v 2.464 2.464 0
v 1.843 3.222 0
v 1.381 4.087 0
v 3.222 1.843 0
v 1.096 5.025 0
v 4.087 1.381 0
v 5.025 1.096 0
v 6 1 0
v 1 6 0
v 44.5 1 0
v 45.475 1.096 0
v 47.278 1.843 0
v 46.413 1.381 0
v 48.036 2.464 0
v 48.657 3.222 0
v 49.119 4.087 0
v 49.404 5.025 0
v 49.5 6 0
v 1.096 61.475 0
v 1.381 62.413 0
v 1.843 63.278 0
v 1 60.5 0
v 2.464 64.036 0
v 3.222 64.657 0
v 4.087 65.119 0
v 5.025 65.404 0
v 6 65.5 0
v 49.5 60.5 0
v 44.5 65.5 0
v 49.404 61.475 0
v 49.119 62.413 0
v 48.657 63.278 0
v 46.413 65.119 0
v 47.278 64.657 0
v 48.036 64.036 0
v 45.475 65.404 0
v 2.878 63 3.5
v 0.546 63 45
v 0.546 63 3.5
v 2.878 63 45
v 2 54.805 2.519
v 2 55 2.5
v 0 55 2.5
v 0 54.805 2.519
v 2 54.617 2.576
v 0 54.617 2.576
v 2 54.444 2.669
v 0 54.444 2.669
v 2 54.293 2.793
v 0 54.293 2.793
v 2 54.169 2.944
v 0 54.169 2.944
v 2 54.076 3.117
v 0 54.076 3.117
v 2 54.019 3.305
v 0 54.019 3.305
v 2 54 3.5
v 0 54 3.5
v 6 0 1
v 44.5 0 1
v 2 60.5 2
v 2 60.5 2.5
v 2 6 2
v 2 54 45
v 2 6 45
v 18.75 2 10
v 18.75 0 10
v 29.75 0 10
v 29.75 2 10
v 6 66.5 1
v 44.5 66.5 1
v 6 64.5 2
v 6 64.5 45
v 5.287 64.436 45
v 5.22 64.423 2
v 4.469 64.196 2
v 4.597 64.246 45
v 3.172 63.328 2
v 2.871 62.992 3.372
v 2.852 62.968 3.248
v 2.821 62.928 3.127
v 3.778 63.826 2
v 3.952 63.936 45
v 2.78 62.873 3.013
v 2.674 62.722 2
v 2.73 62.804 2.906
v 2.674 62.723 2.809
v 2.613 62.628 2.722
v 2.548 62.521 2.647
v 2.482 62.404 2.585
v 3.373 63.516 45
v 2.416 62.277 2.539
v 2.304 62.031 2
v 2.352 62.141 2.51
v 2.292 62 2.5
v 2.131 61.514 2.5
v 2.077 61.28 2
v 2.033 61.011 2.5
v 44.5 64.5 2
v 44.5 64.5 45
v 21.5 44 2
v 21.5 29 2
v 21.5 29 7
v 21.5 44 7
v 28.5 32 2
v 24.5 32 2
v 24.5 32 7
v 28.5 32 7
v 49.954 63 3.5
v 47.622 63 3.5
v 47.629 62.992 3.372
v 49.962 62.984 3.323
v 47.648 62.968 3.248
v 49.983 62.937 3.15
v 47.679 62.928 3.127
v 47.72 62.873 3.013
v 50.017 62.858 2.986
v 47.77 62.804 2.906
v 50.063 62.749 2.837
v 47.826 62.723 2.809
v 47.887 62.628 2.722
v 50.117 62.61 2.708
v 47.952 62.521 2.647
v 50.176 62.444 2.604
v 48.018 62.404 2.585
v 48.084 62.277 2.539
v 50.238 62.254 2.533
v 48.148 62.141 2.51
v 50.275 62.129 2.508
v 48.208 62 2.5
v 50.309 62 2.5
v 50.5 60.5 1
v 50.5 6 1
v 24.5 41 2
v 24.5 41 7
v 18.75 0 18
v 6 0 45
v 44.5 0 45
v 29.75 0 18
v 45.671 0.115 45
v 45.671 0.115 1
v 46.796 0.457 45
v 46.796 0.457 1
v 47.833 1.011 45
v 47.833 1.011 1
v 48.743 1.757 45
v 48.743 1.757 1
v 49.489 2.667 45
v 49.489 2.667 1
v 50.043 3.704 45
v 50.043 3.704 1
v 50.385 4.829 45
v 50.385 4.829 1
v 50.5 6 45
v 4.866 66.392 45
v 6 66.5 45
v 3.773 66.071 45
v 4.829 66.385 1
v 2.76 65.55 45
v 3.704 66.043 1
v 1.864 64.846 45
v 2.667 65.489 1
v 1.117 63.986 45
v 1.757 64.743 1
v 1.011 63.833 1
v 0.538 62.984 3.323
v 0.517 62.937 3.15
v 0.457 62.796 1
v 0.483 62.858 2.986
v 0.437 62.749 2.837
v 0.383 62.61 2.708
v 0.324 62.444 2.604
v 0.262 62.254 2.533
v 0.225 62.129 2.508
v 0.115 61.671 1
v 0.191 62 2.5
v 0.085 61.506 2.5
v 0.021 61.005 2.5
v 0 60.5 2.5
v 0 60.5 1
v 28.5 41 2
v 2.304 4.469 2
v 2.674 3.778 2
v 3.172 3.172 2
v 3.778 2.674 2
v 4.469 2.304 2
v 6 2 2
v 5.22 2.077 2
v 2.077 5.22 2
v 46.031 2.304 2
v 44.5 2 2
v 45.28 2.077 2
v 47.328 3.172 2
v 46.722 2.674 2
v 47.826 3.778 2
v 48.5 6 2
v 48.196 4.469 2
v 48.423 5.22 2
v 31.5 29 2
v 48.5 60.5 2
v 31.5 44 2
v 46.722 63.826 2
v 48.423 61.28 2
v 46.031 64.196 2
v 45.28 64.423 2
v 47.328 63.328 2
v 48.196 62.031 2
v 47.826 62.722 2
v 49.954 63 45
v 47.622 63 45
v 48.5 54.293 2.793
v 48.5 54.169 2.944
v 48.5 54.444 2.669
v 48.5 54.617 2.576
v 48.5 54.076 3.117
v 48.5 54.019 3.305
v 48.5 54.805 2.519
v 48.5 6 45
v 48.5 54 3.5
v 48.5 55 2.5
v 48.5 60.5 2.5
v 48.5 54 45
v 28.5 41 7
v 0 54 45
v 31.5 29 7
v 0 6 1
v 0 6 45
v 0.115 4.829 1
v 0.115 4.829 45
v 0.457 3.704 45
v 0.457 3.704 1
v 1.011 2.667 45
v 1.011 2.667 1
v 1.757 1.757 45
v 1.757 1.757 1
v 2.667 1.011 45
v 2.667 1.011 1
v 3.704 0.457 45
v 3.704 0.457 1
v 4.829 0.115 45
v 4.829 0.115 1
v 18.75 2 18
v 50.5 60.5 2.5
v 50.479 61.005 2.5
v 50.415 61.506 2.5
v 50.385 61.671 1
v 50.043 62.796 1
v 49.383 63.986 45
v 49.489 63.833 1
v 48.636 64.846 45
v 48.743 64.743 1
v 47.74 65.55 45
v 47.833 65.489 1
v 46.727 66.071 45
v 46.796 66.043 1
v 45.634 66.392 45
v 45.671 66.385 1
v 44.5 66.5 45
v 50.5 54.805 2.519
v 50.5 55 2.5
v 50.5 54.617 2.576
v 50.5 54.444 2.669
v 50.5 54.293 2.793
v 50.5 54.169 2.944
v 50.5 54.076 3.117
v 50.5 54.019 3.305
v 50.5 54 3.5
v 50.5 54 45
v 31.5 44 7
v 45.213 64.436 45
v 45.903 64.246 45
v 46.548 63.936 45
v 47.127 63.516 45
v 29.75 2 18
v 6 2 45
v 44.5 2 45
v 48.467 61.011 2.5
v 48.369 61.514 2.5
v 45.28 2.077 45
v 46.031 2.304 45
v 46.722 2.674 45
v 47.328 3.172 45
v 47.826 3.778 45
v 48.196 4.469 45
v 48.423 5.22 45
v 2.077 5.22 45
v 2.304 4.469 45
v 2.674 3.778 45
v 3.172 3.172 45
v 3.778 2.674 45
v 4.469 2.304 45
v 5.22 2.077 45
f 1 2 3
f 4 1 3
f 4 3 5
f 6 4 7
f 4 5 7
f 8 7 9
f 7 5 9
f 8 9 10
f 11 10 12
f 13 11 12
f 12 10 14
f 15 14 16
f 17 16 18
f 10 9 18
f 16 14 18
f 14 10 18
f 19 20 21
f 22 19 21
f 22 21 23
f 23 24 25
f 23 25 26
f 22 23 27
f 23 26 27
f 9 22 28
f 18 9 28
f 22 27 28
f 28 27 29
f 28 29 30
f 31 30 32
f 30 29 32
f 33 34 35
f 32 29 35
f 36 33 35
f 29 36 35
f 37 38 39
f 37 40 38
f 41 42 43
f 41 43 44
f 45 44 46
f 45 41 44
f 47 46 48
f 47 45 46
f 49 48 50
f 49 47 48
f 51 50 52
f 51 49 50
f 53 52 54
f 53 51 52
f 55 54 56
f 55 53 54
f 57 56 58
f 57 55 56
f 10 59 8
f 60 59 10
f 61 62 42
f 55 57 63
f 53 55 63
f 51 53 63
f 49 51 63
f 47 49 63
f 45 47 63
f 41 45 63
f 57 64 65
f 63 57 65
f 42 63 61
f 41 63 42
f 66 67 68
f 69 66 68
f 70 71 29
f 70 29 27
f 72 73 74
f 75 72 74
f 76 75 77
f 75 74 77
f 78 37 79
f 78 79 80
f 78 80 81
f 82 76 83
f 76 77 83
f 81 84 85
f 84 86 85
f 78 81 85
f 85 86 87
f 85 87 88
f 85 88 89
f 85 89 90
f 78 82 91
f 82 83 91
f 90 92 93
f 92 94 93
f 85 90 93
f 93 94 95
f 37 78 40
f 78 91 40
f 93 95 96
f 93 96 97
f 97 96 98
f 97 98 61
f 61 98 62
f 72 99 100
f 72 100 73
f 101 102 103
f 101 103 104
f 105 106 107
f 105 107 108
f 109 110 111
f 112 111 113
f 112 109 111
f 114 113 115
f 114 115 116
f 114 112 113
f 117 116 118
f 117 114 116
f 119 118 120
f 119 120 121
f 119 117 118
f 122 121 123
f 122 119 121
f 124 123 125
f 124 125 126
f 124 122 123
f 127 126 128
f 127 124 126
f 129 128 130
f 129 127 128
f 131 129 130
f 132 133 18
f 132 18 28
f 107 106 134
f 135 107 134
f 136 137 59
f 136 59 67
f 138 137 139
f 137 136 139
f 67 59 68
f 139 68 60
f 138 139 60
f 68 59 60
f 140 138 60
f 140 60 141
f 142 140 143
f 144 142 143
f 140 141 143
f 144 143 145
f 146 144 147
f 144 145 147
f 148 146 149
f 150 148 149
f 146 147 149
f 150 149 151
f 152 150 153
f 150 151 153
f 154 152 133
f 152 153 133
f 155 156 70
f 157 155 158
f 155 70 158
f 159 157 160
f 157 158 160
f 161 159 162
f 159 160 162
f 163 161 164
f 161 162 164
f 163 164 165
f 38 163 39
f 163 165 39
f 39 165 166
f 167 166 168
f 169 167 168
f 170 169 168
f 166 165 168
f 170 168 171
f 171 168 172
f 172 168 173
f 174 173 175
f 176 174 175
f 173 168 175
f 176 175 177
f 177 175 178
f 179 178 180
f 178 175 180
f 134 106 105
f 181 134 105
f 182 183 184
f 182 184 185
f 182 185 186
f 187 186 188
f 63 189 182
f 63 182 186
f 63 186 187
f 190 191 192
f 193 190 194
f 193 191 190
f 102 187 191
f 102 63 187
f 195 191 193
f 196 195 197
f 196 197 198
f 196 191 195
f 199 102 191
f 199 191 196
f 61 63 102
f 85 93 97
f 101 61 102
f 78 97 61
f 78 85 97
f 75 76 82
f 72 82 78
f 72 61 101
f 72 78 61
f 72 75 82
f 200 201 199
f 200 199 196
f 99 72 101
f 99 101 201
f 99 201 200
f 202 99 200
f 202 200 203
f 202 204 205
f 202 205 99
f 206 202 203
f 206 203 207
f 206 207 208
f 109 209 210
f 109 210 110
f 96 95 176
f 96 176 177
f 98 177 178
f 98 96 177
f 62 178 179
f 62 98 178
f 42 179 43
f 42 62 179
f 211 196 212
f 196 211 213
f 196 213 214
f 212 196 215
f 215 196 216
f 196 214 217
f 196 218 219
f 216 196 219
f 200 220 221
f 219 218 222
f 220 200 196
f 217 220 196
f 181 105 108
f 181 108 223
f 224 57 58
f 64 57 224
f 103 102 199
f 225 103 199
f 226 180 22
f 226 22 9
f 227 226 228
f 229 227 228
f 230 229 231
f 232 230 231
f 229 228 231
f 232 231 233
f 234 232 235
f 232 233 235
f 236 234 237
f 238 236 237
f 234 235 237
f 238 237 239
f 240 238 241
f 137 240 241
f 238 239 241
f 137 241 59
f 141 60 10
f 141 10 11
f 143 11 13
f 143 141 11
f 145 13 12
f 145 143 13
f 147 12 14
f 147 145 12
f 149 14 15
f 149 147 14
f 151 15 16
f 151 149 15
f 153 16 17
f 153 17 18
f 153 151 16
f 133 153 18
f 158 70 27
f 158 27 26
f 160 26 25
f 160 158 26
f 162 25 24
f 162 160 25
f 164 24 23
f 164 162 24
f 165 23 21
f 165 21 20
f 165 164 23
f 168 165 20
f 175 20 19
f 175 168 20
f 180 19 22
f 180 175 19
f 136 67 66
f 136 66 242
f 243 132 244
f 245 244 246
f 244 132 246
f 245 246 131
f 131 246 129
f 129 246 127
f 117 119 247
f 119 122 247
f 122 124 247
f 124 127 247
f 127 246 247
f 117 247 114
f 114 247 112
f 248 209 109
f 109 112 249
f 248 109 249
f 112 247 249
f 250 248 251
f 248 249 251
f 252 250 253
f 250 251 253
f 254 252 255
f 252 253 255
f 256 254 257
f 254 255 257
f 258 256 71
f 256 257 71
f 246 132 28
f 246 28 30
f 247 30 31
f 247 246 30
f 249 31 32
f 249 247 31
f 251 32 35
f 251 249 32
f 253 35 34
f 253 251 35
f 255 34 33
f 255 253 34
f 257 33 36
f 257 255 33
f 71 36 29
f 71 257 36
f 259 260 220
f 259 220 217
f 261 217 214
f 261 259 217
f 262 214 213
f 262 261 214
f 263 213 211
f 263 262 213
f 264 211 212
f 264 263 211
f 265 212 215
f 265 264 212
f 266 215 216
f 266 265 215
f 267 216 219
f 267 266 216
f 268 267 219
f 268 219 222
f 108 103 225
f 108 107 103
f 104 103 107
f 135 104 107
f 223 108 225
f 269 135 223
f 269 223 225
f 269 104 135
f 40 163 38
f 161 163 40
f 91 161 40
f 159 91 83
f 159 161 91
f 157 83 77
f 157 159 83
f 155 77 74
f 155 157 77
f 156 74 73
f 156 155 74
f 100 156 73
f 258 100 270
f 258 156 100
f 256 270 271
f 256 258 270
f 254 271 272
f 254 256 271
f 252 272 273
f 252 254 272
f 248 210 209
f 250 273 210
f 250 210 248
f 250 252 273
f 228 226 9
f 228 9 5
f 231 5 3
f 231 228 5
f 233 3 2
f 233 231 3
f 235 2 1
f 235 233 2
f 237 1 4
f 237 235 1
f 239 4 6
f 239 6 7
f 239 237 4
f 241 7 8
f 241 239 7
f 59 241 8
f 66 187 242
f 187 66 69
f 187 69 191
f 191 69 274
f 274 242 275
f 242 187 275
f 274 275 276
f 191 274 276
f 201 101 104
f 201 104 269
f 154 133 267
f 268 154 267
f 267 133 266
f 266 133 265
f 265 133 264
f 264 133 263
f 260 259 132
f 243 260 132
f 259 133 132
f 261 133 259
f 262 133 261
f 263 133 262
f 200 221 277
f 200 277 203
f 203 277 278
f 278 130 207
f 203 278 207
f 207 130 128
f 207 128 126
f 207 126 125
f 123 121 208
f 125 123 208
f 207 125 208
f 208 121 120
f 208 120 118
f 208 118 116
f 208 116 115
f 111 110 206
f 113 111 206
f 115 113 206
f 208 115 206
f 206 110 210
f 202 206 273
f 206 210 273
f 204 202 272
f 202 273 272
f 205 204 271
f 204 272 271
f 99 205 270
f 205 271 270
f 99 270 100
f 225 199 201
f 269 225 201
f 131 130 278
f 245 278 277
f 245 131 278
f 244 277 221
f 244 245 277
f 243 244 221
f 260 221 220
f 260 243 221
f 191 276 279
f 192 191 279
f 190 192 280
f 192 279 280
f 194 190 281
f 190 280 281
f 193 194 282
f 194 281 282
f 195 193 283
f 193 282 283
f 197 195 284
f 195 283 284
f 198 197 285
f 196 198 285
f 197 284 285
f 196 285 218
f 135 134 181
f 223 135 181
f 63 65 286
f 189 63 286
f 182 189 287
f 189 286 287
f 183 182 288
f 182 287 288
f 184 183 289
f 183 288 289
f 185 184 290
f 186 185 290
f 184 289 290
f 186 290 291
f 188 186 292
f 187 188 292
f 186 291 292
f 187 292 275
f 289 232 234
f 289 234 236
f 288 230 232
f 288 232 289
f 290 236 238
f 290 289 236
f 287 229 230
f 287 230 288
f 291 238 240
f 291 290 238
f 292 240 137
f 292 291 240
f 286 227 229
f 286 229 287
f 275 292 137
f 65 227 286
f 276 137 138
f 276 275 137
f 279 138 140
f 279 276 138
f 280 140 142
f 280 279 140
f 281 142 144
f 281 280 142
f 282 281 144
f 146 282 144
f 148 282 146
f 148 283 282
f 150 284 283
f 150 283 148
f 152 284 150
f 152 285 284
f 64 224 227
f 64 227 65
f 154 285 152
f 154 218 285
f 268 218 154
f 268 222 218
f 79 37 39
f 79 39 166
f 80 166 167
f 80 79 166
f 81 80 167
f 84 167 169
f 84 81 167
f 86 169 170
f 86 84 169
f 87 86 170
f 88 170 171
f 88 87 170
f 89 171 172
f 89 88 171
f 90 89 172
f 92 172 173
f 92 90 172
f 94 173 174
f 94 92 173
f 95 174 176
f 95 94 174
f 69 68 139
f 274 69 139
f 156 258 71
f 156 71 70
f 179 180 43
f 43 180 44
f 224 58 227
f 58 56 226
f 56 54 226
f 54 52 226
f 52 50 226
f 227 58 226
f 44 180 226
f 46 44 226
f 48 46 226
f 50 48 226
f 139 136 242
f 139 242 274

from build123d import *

# Parameters (mm, degrees)
BOSS_EXTRU_1_DEPTH      = 45
ENL_V_MAT_EXTRU_1_DEPTH = 43
ENL_V_MAT_EXTRU_2_DEPTH = 95.855152733
CHANFREIN1_SIZE         = 1
ESQUISSE6_W             = 10
ESQUISSE6_H             = 15
ESQUISSE6_W_2           = 4
ESQUISSE6_H_2           = 9
BOSS_EXTRU_2_DEPTH      = 5
ESQUISSE8_W             = 11
ESQUISSE8_H             = 8
ENL_V_MAT_EXTRU_5_DEPTH = 10


with BuildPart() as part:
    # Esquisse1 → Boss.-Extru.1 (new body)
    with BuildSketch(Plane.XY):
        with BuildLine():
            Line((6, 0), (44.5, 0))
            ThreePointArc((44.5, 0), (48.742640687, 1.757359313), (50.5, 6))
            Line((50.5, 6), (50.5, 60.5))
            ThreePointArc((50.5, 60.5), (48.742640687, 64.742640687), (44.5, 66.5))
            Line((44.5, 66.5), (6, 66.5))
            ThreePointArc((6, 66.5), (1.757359313, 64.742640687), (0, 60.5))
            Line((0, 60.5), (0, 6))
            ThreePointArc((0, 6), (1.757359313, 1.757359313), (6, 0))
        make_face()
    extrude(amount=BOSS_EXTRU_1_DEPTH)

    # Esquisse3 → Enlèv. mat.-Extru.1 (cut)
    with BuildSketch(Plane.XY.offset(45)):
        with BuildLine():
            Line((2, 60.5), (2, 6))
            ThreePointArc((2, 6), (3.171572875, 3.171572875), (6, 2))
            Line((6, 2), (44.5, 2))
            ThreePointArc((44.5, 2), (47.328427125, 3.171572875), (48.5, 6))
            Line((48.5, 6), (48.5, 60.5))
            ThreePointArc((48.5, 60.5), (47.328427125, 63.328427125), (44.5, 64.5))
            Line((44.5, 64.5), (6, 64.5))
            ThreePointArc((6, 64.5), (3.171572875, 63.328427125), (2, 60.5))
        make_face()
    extrude(amount=-ENL_V_MAT_EXTRU_1_DEPTH, mode=Mode.SUBTRACT)

    # Esquisse4 → Enlèv. mat.-Extru.2 (cut, through all)
    with BuildSketch(Plane(origin=(50.5, 0, 0), x_dir=(0, 0, -1), z_dir=(1, 0, 0))):
        with BuildLine():
            Line((-57.973811458, 63), (-3.5, 63))
            ThreePointArc((-3.5, 63), (-2.792893219, 62.707106781), (-2.5, 62))
            Line((-2.5, 62), (-2.5, 55))
            ThreePointArc((-2.5, 55), (-2.792893219, 54.292893219), (-3.5, 54))
            Line((-3.5, 54), (-57.973811458, 54))
            Line((-57.973811458, 54), (-57.973811458, 63))
        make_face()
    extrude(amount=-ENL_V_MAT_EXTRU_2_DEPTH, mode=Mode.SUBTRACT)

    # Chanfrein1
    chanfrein1_edges = [part.edges().sort_by_distance(p)[0] for p in [
        (50.5, 33.25, 0),
        (48.742640687, 1.757359313, 0),
        (25.25, 0, 0),
        (1.757359313, 1.757359313, 0),
        (0, 33.25, 0),
        (1.757359313, 64.742640687, 0),
        (25.25, 66.5, 0),
        (48.742640687, 64.742640687, 0),
    ]]
    chamfer(chanfrein1_edges, length=CHANFREIN1_SIZE)

    # Esquisse6 → Boss.-Extru.2 (add)
    with BuildSketch(Plane.XY.offset(2)):
        with Locations((26.5, 36.5)):
            Rectangle(ESQUISSE6_W, ESQUISSE6_H)
        with Locations((26.5, 36.5)):
            Rectangle(ESQUISSE6_W_2, ESQUISSE6_H_2, mode=Mode.SUBTRACT)
    extrude(amount=BOSS_EXTRU_2_DEPTH)

    # Esquisse8 → Enlèv. mat.-Extru.5 (cut)
    with BuildSketch(Plane.XZ):
        with Locations((24.25, 14)):
            Rectangle(ESQUISSE8_W, ESQUISSE8_H)
    extrude(amount=-ENL_V_MAT_EXTRU_5_DEPTH, mode=Mode.SUBTRACT)


solid = part.part
